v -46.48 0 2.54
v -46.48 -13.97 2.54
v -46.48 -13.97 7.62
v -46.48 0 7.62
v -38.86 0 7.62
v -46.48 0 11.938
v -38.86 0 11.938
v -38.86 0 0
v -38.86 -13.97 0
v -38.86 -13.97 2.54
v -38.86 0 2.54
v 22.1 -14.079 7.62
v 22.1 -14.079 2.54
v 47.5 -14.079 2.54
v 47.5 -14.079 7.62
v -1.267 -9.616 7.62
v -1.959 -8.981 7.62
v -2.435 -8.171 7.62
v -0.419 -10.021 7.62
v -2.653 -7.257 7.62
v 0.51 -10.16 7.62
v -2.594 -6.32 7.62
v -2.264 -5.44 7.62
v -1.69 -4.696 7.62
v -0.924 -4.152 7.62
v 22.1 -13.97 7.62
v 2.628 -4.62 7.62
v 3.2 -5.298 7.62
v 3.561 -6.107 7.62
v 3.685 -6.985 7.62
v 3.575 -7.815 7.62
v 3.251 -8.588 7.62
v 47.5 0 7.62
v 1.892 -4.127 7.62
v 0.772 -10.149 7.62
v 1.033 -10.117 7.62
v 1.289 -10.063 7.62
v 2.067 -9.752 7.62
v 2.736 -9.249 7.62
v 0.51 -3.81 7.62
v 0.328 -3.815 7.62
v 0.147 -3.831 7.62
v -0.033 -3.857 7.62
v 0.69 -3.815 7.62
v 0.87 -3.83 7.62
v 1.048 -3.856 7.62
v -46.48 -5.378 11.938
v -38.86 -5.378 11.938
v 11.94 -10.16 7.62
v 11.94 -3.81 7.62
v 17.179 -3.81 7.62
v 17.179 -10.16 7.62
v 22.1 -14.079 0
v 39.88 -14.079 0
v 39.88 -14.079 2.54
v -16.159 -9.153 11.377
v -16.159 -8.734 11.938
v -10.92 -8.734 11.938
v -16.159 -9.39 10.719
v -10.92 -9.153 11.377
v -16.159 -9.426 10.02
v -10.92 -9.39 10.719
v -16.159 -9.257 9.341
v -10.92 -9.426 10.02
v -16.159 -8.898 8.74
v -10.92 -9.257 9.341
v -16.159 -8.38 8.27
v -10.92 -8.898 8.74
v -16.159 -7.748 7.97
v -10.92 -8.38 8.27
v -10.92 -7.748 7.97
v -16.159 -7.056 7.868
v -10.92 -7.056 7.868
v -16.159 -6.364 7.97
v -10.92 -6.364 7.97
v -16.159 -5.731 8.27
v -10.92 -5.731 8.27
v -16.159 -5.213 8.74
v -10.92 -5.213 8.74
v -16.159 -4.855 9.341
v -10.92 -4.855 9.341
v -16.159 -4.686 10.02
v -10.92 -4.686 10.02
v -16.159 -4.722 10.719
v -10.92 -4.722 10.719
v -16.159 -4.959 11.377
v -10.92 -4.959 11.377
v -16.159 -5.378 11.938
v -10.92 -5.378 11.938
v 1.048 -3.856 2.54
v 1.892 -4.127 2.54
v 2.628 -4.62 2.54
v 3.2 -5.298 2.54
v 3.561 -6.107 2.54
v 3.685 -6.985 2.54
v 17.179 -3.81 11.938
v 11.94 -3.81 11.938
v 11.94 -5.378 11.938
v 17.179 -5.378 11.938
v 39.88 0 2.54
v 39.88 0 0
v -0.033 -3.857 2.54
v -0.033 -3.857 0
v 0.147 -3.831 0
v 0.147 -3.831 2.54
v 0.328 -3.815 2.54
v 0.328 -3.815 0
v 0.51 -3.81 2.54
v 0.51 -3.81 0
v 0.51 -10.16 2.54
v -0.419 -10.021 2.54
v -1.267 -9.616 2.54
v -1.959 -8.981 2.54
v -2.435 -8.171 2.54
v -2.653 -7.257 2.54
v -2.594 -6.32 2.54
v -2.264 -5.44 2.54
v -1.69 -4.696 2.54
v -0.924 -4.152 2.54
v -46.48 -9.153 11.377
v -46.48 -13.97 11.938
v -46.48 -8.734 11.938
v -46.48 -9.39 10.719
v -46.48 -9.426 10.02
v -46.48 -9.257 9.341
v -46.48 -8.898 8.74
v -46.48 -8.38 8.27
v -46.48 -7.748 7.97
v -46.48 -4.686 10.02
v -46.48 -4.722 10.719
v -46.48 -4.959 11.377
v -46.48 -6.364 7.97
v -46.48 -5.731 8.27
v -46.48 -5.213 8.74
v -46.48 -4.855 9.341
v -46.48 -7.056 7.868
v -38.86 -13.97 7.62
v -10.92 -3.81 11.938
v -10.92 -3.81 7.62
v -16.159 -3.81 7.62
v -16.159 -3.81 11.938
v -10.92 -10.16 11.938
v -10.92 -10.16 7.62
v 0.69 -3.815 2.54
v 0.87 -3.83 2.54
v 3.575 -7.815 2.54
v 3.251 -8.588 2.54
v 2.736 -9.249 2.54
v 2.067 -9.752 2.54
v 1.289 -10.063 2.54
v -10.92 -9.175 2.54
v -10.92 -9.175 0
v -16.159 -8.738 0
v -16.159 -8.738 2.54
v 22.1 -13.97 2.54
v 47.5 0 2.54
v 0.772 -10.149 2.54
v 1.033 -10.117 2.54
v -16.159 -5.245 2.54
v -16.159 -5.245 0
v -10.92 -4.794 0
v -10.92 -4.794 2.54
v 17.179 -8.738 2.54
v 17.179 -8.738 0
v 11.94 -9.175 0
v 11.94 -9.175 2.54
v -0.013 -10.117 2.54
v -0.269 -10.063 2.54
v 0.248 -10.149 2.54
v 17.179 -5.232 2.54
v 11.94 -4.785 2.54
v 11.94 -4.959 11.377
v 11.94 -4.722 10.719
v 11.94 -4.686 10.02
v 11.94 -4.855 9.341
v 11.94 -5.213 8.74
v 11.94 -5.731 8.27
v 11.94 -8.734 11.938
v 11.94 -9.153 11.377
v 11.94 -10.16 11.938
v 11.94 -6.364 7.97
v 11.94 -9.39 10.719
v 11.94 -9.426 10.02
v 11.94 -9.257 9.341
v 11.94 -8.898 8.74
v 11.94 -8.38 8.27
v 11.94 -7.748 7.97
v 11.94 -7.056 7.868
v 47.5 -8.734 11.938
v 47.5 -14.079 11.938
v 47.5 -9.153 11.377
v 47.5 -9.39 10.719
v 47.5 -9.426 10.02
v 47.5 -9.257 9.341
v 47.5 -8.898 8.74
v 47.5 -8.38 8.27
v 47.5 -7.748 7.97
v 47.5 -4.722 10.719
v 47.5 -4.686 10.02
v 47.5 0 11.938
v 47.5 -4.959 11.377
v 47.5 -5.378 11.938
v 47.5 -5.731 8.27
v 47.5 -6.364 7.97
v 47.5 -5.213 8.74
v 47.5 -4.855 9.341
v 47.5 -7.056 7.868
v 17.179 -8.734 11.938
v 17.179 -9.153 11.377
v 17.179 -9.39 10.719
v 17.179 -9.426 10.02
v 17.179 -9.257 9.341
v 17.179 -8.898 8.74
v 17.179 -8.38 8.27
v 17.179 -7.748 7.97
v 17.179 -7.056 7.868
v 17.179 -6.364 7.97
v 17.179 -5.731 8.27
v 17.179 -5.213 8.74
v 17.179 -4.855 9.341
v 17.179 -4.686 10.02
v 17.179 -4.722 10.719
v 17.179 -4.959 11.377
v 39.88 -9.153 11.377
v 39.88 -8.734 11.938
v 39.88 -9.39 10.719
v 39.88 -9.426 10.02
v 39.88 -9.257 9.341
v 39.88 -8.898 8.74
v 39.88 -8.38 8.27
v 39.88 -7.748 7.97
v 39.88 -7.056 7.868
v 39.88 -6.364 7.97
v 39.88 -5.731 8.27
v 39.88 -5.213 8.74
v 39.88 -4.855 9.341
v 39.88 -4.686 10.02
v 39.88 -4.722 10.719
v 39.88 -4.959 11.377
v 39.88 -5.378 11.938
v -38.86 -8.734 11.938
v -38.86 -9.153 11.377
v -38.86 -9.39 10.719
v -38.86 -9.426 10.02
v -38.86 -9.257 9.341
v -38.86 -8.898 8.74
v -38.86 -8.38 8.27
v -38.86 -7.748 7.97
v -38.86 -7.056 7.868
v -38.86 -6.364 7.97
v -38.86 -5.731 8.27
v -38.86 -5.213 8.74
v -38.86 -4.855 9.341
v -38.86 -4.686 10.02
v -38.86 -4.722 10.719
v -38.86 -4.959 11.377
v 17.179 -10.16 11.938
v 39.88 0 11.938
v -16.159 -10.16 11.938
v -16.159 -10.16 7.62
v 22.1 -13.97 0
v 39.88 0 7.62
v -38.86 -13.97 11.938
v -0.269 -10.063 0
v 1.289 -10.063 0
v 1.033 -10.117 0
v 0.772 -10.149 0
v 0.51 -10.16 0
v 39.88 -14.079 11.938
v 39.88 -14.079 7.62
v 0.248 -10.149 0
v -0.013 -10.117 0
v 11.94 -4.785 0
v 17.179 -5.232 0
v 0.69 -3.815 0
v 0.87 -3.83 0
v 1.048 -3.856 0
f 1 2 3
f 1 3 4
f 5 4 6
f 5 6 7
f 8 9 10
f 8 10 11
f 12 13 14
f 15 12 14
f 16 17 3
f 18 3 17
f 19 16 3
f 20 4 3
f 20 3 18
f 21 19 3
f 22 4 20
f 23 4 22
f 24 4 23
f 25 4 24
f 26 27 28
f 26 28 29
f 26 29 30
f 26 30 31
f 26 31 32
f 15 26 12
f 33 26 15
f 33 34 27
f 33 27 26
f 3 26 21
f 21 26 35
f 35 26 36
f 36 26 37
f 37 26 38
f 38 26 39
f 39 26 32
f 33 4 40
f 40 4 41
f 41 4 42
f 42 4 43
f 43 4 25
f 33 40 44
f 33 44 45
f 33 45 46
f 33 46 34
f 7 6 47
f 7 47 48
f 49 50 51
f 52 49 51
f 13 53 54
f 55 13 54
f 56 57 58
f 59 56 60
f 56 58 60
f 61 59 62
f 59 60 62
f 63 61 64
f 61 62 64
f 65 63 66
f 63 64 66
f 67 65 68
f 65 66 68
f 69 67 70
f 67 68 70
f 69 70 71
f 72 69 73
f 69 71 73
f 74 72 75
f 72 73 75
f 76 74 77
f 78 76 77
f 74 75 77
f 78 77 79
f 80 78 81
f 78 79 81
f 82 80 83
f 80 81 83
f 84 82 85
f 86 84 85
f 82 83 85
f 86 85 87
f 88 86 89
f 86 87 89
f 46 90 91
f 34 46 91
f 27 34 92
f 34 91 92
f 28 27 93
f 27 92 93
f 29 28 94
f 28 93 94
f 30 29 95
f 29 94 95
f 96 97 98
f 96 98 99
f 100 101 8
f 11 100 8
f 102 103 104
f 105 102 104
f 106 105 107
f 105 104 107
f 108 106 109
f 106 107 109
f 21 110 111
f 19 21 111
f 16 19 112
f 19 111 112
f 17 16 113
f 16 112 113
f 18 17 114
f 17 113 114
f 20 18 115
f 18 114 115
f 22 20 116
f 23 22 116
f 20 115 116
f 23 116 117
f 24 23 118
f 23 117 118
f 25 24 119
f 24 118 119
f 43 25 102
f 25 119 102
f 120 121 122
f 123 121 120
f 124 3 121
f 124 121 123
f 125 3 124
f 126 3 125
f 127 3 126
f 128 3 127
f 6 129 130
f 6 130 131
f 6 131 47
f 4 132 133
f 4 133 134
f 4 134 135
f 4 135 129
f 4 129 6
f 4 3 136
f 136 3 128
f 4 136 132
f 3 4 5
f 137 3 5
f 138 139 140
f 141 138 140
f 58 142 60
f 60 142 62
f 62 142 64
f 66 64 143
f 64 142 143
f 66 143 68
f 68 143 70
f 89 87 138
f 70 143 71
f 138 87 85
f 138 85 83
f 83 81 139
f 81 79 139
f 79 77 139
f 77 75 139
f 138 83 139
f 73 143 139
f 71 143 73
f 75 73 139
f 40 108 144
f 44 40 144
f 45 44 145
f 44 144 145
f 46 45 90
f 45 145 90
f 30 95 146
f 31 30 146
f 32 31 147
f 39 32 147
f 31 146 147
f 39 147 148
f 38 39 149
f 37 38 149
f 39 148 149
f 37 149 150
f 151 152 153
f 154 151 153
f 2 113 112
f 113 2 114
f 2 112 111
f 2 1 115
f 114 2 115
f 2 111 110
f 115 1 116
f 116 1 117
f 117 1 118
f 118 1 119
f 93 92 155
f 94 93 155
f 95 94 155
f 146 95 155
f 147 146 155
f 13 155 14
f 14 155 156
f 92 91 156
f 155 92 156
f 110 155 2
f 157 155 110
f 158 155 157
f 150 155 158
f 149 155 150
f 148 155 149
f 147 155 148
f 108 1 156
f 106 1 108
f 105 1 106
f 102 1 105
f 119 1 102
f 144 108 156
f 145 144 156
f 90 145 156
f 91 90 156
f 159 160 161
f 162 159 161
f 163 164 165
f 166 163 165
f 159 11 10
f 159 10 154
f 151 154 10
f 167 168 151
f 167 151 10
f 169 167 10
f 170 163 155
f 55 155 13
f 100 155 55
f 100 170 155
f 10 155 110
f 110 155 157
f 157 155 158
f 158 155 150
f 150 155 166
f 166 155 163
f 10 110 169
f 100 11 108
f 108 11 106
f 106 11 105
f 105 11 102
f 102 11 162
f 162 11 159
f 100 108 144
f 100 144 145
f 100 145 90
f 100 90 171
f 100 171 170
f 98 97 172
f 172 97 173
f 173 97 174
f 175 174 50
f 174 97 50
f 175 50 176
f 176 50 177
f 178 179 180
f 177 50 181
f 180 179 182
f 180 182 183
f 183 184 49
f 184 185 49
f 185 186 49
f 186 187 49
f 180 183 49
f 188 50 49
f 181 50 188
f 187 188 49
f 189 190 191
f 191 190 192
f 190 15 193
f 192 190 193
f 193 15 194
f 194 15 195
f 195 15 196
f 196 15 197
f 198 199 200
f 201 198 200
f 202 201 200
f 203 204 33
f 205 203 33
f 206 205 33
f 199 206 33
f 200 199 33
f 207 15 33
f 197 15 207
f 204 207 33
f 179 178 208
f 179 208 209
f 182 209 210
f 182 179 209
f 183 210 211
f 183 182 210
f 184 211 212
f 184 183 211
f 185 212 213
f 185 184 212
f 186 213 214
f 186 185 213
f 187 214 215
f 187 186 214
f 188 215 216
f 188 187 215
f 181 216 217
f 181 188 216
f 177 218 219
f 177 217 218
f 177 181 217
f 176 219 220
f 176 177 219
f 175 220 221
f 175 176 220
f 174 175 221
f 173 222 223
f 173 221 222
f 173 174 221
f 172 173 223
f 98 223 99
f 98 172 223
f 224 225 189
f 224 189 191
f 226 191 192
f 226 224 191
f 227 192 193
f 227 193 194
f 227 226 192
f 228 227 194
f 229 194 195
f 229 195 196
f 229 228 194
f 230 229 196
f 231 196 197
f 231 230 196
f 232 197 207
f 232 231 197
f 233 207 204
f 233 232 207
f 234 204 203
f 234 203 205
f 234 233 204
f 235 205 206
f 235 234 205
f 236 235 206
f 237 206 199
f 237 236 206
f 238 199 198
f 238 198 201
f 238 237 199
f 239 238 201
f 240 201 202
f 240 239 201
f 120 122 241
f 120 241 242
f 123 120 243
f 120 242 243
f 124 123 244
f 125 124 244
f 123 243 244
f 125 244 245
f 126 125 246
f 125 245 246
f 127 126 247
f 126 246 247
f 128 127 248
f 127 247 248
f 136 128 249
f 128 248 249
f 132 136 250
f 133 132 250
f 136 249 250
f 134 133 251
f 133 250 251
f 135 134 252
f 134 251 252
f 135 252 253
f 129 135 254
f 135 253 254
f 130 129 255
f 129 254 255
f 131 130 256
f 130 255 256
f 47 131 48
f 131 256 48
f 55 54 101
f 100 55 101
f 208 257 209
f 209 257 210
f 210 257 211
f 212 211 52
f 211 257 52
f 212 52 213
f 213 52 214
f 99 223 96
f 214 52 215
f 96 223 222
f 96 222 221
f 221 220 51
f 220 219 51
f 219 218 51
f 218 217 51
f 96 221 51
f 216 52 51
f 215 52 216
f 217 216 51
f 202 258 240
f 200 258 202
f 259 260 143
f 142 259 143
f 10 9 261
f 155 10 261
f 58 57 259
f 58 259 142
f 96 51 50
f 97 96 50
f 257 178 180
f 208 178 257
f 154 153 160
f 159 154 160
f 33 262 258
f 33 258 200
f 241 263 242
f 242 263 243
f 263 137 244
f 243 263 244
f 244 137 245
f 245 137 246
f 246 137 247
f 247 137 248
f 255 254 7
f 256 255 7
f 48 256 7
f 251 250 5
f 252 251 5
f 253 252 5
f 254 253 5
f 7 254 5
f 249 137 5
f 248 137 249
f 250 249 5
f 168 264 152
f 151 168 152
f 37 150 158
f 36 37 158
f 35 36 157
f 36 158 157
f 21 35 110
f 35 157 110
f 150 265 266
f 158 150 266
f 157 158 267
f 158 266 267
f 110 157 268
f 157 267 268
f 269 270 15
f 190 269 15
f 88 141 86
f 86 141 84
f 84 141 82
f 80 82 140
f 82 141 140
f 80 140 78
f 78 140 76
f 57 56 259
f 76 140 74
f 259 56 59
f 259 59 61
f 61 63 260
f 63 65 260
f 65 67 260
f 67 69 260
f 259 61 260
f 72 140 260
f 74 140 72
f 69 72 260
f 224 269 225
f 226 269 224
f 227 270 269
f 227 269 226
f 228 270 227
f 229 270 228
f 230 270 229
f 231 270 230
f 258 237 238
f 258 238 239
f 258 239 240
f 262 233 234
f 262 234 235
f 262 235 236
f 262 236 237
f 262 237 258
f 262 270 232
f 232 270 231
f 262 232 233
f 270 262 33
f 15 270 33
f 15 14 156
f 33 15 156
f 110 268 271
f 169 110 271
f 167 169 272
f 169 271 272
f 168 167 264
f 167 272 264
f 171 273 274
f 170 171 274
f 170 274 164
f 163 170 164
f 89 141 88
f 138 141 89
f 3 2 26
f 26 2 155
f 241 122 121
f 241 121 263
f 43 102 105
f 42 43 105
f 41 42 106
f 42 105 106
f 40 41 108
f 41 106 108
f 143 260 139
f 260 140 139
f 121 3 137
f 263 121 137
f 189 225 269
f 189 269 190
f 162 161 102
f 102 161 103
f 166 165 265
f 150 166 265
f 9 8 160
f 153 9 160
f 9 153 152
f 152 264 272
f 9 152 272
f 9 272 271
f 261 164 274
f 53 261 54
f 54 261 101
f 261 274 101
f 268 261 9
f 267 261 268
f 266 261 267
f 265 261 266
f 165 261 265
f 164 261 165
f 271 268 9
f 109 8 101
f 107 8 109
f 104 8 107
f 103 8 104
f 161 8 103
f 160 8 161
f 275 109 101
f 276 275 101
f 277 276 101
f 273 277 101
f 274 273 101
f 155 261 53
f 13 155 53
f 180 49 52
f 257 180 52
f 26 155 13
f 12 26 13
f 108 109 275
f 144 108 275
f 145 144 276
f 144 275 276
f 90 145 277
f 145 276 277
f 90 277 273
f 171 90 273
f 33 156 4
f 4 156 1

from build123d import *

# Parameters (mm, degrees)
F0_W          = 17.78
F0_H          = 13.97
F1_DEPTH      = 2.54
F2_START      = 2.54
F0_W_2        = 7.62
F0_H_2        = 14.0794469044
F2_DEPTH      = 5.08
F3_START      = 7.62
F3_DEPTH      = 4.318
F4_R          = 2.38125
F5_DEPTH      = 50.8
F5_DEPTH_BACK = 50.8


with BuildPart() as f1:
    # F0 (on Top) → F1 (new body)
    with BuildSketch(Plane.XY):
        Polygon((-21.0799529247, 0), (-21.0799529247, -13.97), (-10.9199529247, -13.97), (-10.9199529247, -10.16), (-16.1587029247, -10.16), (-16.1587029247, -8.7376), (-16.1587029247, -5.2451), (-16.1587029247, -3.81), (-10.9199529247, -3.81), (-10.9199529247, 0), align=None)
        with Locations((-29.9699529247, -6.985)):
            Rectangle(F0_W, F0_H)
        Polygon((-10.9199529247, -10.16), (-10.9199529247, -13.97), (11.9400470753, -13.97), (11.9400470753, -10.16), (0.5100470753, -10.16), align=None)
        Polygon((11.9400470753, -10.16), (11.9400470753, -13.97), (22.1000470753, -13.97), (22.1000470753, 0), (11.9400470753, 0), (11.9400470753, -3.81), (17.1787970753, -3.81), (17.1787970753, -5.2324), (17.1787970753, -8.7376), (17.1787970753, -10.16), align=None)
        with BuildLine():
            Line((-10.9199529247, -9.1745346656), (-10.9199529247, -10.16))
            Line((-10.9199529247, -10.16), (0.5100470753, -10.16))
            ThreePointArc((0.5100470753, -10.16), (0.1173051299, -10.1356156167), (-0.2694042043, -10.0628370169))
            Line((-0.2694042043, -10.0628370169), (-10.9199529247, -9.1745346656))
        make_face()
        Polygon((-16.1587029247, -10.16), (-10.9199529247, -10.16), (-10.9199529247, -9.1745346656), (-16.1587029247, -8.7376), align=None)
        Polygon((11.9400470753, 0), (-10.9199529247, 0), (-10.9199529247, -3.81), (0.5100470753, -3.81), (11.9400470753, -3.81), align=None)
        Polygon((22.1000470753, 0), (22.1000470753, -13.97), (22.1000470753, -14.0794469044), (39.8800470753, -14.0794469044), (39.8800470753, 0), align=None)
        Polygon((11.9400470753, -9.1745346656), (11.9400470753, -10.16), (17.1787970753, -10.16), (17.1787970753, -8.7376), align=None)
        with BuildLine():
            Line((0.5100470753, -10.16), (11.9400470753, -10.16))
            Line((11.9400470753, -10.16), (11.9400470753, -9.1745346656))
            Line((11.9400470753, -9.1745346656), (1.2894983548, -10.0628370169))
            ThreePointArc((1.2894983548, -10.0628370169), (0.9027890206, -10.1356156167), (0.5100470753, -10.16))
        make_face()
        Polygon((-10.9199529247, -4.7940685714), (-10.9199529247, -3.81), (-16.1587029247, -3.81), (-16.1587029247, -5.2451), align=None)
        with BuildLine():
            Line((0.5100470753, -3.81), (-10.9199529247, -3.81))
            Line((-10.9199529247, -3.81), (-10.9199529247, -4.7940685714))
            Line((-10.9199529247, -4.7940685714), (-0.0326351146, -3.8567223523))
            ThreePointArc((-0.0326351146, -3.8567223523), (0.237702194, -3.8217021535), (0.5100470753, -3.81))
        make_face()
        with BuildLine():
            Line((11.9400470753, -4.78536), (11.9400470753, -3.81))
            Line((11.9400470753, -3.81), (0.5100470753, -3.81))
            ThreePointArc((0.5100470753, -3.81), (0.7799993252, -3.8214970708), (1.0479965137, -3.8559050187))
            Line((1.0479965137, -3.8559050187), (11.9400470753, -4.78536))
        make_face()
        Polygon((17.1787970753, -3.81), (11.9400470753, -3.81), (11.9400470753, -4.78536), (17.1787970753, -5.2324), align=None)
    extrude(amount=F1_DEPTH)


with BuildPart() as f2:
    # F0 (on Top) → F2 (new body)
    with BuildSketch(Plane.XY.offset(F2_START)):
        Polygon((-21.0799529247, 0), (-21.0799529247, -13.97), (-10.9199529247, -13.97), (-10.9199529247, -10.16), (-16.1587029247, -10.16), (-16.1587029247, -8.7376), (-16.1587029247, -5.2451), (-16.1587029247, -3.81), (-10.9199529247, -3.81), (-10.9199529247, 0), align=None)
        with Locations((-29.9699529247, -6.985)):
            Rectangle(F0_W, F0_H)
        Polygon((-10.9199529247, -10.16), (-10.9199529247, -13.97), (11.9400470753, -13.97), (11.9400470753, -10.16), (0.5100470753, -10.16), align=None)
        with Locations((-42.6699529247, -6.985)):
            Rectangle(F0_W_2, F0_H)
        Polygon((11.9400470753, -10.16), (11.9400470753, -13.97), (22.1000470753, -13.97), (22.1000470753, 0), (11.9400470753, 0), (11.9400470753, -3.81), (17.1787970753, -3.81), (17.1787970753, -5.2324), (17.1787970753, -8.7376), (17.1787970753, -10.16), align=None)
        with BuildLine():
            Line((-10.9199529247, -9.1745346656), (-10.9199529247, -10.16))
            Line((-10.9199529247, -10.16), (0.5100470753, -10.16))
            ThreePointArc((0.5100470753, -10.16), (0.1173051299, -10.1356156167), (-0.2694042043, -10.0628370169))
            Line((-0.2694042043, -10.0628370169), (-10.9199529247, -9.1745346656))
        make_face()
        Polygon((-16.1587029247, -10.16), (-10.9199529247, -10.16), (-10.9199529247, -9.1745346656), (-16.1587029247, -8.7376), align=None)
        Polygon((11.9400470753, 0), (-10.9199529247, 0), (-10.9199529247, -3.81), (0.5100470753, -3.81), (11.9400470753, -3.81), align=None)
        Polygon((22.1000470753, 0), (22.1000470753, -13.97), (22.1000470753, -14.0794469044), (39.8800470753, -14.0794469044), (39.8800470753, 0), align=None)
        Polygon((11.9400470753, -9.1745346656), (11.9400470753, -10.16), (17.1787970753, -10.16), (17.1787970753, -8.7376), align=None)
        with BuildLine():
            Line((0.5100470753, -10.16), (11.9400470753, -10.16))
            Line((11.9400470753, -10.16), (11.9400470753, -9.1745346656))
            Line((11.9400470753, -9.1745346656), (1.2894983548, -10.0628370169))
            ThreePointArc((1.2894983548, -10.0628370169), (0.9027890206, -10.1356156167), (0.5100470753, -10.16))
        make_face()
        with BuildLine():
            Line((-10.9199529247, -4.7940685714), (-10.9199529247, -9.1745346656))
            Line((-10.9199529247, -9.1745346656), (-0.2694042043, -10.0628370169))
            ThreePointArc((-0.2694042043, -10.0628370169), (-2.6626448473, -6.8639588303), (-0.0326351146, -3.8567223523))
            Line((-0.0326351146, -3.8567223523), (-10.9199529247, -4.7940685714))
        make_face()
        Polygon((-16.1587029247, -8.7376), (-10.9199529247, -9.1745346656), (-10.9199529247, -4.7940685714), (-16.1587029247, -5.2451), align=None)
        Polygon((-10.9199529247, -4.7940685714), (-10.9199529247, -3.81), (-16.1587029247, -3.81), (-16.1587029247, -5.2451), align=None)
        with BuildLine():
            Line((0.5100470753, -3.81), (-10.9199529247, -3.81))
            Line((-10.9199529247, -3.81), (-10.9199529247, -4.7940685714))
            Line((-10.9199529247, -4.7940685714), (-0.0326351146, -3.8567223523))
            ThreePointArc((-0.0326351146, -3.8567223523), (0.237702194, -3.8217021535), (0.5100470753, -3.81))
        make_face()
        Polygon((11.9400470753, -4.78536), (11.9400470753, -9.1745346656), (17.1787970753, -8.7376), (17.1787970753, -5.2324), align=None)
        with BuildLine():
            Line((1.2894983548, -10.0628370169), (11.9400470753, -9.1745346656))
            Line((11.9400470753, -9.1745346656), (11.9400470753, -4.78536))
            Line((11.9400470753, -4.78536), (1.0479965137, -3.8559050187))
            ThreePointArc((1.0479965137, -3.8559050187), (2.9378665153, -4.938950693), (3.6850470753, -6.985))
            ThreePointArc((3.6850470753, -6.985), (3.0155792356, -8.9351111747), (1.2894983548, -10.0628370169))
        make_face()
        with BuildLine():
            Line((11.9400470753, -4.78536), (11.9400470753, -3.81))
            Line((11.9400470753, -3.81), (0.5100470753, -3.81))
            ThreePointArc((0.5100470753, -3.81), (0.7799993252, -3.8214970708), (1.0479965137, -3.8559050187))
            Line((1.0479965137, -3.8559050187), (11.9400470753, -4.78536))
        make_face()
        Polygon((17.1787970753, -3.81), (11.9400470753, -3.81), (11.9400470753, -4.78536), (17.1787970753, -5.2324), align=None)
        with Locations((43.6900470753, -7.0397234522)):
            Rectangle(F0_W_2, F0_H_2)
    extrude(amount=F2_DEPTH)


with BuildPart() as f3:
    # F0 (on Top) → F3 (new body)
    with BuildSketch(Plane.XY.offset(F3_START)):
        Polygon((-16.1587029247, -10.16), (-10.9199529247, -10.16), (-10.9199529247, -9.1745346656), (-16.1587029247, -8.7376), align=None)
        Polygon((-10.9199529247, -4.7940685714), (-10.9199529247, -3.81), (-16.1587029247, -3.81), (-16.1587029247, -5.2451), align=None)
        Polygon((-16.1587029247, -8.7376), (-10.9199529247, -9.1745346656), (-10.9199529247, -4.7940685714), (-16.1587029247, -5.2451), align=None)
    extrude(amount=F3_DEPTH)


with BuildPart() as f3b:
    # F0 (on Top) → F3, piece 2 (new body)
    with BuildSketch(Plane.XY.offset(F3_START)):
        Polygon((17.1787970753, -3.81), (11.9400470753, -3.81), (11.9400470753, -4.78536), (17.1787970753, -5.2324), align=None)
        Polygon((11.9400470753, -4.78536), (11.9400470753, -9.1745346656), (17.1787970753, -8.7376), (17.1787970753, -5.2324), align=None)
        Polygon((11.9400470753, -9.1745346656), (11.9400470753, -10.16), (17.1787970753, -10.16), (17.1787970753, -8.7376), align=None)
    extrude(amount=F3_DEPTH)


with BuildPart() as f3c:
    # F0 (on Top) → F3, piece 3 (new body)
    with BuildSketch(Plane.XY.offset(F3_START)):
        with Locations((-42.6699529247, -6.985)):
            Rectangle(F0_W_2, F0_H)
    extrude(amount=F3_DEPTH)


with BuildPart() as f3d:
    # F0 (on Top) → F3, piece 4 (new body)
    with BuildSketch(Plane.XY.offset(F3_START)):
        with Locations((43.6900470753, -7.0397234522)):
            Rectangle(F0_W_2, F0_H_2)
    extrude(amount=F3_DEPTH)


with BuildPart() as f5_tool:
    # F4 (on Right) → F5 (new body, two sides)
    with BuildSketch(Plane.YZ) as f5_sk:
        with Locations((-7.0559619926, 10.248853825)):
            Circle(F4_R)
    extrude(amount=-F5_DEPTH)
    extrude(f5_sk.sketch, amount=F5_DEPTH_BACK)


with BuildPart() as f3_1:
    add(f3.part)

    # F5: cut by f5_tool
    add(f5_tool.part, mode=Mode.SUBTRACT)


with BuildPart() as f3b_1:
    add(f3b.part)

    # F5: cut by f5_tool
    add(f5_tool.part, mode=Mode.SUBTRACT)


with BuildPart() as f3c_1:
    add(f3c.part)

    # F5: cut by f5_tool
    add(f5_tool.part, mode=Mode.SUBTRACT)


with BuildPart() as f3d_1:
    add(f3d.part)

    # F5: cut by f5_tool
    add(f5_tool.part, mode=Mode.SUBTRACT)


solid = Compound([f1.part, f2.part, f3_1.part, f3b_1.part, f3c_1.part, f3d_1.part])
